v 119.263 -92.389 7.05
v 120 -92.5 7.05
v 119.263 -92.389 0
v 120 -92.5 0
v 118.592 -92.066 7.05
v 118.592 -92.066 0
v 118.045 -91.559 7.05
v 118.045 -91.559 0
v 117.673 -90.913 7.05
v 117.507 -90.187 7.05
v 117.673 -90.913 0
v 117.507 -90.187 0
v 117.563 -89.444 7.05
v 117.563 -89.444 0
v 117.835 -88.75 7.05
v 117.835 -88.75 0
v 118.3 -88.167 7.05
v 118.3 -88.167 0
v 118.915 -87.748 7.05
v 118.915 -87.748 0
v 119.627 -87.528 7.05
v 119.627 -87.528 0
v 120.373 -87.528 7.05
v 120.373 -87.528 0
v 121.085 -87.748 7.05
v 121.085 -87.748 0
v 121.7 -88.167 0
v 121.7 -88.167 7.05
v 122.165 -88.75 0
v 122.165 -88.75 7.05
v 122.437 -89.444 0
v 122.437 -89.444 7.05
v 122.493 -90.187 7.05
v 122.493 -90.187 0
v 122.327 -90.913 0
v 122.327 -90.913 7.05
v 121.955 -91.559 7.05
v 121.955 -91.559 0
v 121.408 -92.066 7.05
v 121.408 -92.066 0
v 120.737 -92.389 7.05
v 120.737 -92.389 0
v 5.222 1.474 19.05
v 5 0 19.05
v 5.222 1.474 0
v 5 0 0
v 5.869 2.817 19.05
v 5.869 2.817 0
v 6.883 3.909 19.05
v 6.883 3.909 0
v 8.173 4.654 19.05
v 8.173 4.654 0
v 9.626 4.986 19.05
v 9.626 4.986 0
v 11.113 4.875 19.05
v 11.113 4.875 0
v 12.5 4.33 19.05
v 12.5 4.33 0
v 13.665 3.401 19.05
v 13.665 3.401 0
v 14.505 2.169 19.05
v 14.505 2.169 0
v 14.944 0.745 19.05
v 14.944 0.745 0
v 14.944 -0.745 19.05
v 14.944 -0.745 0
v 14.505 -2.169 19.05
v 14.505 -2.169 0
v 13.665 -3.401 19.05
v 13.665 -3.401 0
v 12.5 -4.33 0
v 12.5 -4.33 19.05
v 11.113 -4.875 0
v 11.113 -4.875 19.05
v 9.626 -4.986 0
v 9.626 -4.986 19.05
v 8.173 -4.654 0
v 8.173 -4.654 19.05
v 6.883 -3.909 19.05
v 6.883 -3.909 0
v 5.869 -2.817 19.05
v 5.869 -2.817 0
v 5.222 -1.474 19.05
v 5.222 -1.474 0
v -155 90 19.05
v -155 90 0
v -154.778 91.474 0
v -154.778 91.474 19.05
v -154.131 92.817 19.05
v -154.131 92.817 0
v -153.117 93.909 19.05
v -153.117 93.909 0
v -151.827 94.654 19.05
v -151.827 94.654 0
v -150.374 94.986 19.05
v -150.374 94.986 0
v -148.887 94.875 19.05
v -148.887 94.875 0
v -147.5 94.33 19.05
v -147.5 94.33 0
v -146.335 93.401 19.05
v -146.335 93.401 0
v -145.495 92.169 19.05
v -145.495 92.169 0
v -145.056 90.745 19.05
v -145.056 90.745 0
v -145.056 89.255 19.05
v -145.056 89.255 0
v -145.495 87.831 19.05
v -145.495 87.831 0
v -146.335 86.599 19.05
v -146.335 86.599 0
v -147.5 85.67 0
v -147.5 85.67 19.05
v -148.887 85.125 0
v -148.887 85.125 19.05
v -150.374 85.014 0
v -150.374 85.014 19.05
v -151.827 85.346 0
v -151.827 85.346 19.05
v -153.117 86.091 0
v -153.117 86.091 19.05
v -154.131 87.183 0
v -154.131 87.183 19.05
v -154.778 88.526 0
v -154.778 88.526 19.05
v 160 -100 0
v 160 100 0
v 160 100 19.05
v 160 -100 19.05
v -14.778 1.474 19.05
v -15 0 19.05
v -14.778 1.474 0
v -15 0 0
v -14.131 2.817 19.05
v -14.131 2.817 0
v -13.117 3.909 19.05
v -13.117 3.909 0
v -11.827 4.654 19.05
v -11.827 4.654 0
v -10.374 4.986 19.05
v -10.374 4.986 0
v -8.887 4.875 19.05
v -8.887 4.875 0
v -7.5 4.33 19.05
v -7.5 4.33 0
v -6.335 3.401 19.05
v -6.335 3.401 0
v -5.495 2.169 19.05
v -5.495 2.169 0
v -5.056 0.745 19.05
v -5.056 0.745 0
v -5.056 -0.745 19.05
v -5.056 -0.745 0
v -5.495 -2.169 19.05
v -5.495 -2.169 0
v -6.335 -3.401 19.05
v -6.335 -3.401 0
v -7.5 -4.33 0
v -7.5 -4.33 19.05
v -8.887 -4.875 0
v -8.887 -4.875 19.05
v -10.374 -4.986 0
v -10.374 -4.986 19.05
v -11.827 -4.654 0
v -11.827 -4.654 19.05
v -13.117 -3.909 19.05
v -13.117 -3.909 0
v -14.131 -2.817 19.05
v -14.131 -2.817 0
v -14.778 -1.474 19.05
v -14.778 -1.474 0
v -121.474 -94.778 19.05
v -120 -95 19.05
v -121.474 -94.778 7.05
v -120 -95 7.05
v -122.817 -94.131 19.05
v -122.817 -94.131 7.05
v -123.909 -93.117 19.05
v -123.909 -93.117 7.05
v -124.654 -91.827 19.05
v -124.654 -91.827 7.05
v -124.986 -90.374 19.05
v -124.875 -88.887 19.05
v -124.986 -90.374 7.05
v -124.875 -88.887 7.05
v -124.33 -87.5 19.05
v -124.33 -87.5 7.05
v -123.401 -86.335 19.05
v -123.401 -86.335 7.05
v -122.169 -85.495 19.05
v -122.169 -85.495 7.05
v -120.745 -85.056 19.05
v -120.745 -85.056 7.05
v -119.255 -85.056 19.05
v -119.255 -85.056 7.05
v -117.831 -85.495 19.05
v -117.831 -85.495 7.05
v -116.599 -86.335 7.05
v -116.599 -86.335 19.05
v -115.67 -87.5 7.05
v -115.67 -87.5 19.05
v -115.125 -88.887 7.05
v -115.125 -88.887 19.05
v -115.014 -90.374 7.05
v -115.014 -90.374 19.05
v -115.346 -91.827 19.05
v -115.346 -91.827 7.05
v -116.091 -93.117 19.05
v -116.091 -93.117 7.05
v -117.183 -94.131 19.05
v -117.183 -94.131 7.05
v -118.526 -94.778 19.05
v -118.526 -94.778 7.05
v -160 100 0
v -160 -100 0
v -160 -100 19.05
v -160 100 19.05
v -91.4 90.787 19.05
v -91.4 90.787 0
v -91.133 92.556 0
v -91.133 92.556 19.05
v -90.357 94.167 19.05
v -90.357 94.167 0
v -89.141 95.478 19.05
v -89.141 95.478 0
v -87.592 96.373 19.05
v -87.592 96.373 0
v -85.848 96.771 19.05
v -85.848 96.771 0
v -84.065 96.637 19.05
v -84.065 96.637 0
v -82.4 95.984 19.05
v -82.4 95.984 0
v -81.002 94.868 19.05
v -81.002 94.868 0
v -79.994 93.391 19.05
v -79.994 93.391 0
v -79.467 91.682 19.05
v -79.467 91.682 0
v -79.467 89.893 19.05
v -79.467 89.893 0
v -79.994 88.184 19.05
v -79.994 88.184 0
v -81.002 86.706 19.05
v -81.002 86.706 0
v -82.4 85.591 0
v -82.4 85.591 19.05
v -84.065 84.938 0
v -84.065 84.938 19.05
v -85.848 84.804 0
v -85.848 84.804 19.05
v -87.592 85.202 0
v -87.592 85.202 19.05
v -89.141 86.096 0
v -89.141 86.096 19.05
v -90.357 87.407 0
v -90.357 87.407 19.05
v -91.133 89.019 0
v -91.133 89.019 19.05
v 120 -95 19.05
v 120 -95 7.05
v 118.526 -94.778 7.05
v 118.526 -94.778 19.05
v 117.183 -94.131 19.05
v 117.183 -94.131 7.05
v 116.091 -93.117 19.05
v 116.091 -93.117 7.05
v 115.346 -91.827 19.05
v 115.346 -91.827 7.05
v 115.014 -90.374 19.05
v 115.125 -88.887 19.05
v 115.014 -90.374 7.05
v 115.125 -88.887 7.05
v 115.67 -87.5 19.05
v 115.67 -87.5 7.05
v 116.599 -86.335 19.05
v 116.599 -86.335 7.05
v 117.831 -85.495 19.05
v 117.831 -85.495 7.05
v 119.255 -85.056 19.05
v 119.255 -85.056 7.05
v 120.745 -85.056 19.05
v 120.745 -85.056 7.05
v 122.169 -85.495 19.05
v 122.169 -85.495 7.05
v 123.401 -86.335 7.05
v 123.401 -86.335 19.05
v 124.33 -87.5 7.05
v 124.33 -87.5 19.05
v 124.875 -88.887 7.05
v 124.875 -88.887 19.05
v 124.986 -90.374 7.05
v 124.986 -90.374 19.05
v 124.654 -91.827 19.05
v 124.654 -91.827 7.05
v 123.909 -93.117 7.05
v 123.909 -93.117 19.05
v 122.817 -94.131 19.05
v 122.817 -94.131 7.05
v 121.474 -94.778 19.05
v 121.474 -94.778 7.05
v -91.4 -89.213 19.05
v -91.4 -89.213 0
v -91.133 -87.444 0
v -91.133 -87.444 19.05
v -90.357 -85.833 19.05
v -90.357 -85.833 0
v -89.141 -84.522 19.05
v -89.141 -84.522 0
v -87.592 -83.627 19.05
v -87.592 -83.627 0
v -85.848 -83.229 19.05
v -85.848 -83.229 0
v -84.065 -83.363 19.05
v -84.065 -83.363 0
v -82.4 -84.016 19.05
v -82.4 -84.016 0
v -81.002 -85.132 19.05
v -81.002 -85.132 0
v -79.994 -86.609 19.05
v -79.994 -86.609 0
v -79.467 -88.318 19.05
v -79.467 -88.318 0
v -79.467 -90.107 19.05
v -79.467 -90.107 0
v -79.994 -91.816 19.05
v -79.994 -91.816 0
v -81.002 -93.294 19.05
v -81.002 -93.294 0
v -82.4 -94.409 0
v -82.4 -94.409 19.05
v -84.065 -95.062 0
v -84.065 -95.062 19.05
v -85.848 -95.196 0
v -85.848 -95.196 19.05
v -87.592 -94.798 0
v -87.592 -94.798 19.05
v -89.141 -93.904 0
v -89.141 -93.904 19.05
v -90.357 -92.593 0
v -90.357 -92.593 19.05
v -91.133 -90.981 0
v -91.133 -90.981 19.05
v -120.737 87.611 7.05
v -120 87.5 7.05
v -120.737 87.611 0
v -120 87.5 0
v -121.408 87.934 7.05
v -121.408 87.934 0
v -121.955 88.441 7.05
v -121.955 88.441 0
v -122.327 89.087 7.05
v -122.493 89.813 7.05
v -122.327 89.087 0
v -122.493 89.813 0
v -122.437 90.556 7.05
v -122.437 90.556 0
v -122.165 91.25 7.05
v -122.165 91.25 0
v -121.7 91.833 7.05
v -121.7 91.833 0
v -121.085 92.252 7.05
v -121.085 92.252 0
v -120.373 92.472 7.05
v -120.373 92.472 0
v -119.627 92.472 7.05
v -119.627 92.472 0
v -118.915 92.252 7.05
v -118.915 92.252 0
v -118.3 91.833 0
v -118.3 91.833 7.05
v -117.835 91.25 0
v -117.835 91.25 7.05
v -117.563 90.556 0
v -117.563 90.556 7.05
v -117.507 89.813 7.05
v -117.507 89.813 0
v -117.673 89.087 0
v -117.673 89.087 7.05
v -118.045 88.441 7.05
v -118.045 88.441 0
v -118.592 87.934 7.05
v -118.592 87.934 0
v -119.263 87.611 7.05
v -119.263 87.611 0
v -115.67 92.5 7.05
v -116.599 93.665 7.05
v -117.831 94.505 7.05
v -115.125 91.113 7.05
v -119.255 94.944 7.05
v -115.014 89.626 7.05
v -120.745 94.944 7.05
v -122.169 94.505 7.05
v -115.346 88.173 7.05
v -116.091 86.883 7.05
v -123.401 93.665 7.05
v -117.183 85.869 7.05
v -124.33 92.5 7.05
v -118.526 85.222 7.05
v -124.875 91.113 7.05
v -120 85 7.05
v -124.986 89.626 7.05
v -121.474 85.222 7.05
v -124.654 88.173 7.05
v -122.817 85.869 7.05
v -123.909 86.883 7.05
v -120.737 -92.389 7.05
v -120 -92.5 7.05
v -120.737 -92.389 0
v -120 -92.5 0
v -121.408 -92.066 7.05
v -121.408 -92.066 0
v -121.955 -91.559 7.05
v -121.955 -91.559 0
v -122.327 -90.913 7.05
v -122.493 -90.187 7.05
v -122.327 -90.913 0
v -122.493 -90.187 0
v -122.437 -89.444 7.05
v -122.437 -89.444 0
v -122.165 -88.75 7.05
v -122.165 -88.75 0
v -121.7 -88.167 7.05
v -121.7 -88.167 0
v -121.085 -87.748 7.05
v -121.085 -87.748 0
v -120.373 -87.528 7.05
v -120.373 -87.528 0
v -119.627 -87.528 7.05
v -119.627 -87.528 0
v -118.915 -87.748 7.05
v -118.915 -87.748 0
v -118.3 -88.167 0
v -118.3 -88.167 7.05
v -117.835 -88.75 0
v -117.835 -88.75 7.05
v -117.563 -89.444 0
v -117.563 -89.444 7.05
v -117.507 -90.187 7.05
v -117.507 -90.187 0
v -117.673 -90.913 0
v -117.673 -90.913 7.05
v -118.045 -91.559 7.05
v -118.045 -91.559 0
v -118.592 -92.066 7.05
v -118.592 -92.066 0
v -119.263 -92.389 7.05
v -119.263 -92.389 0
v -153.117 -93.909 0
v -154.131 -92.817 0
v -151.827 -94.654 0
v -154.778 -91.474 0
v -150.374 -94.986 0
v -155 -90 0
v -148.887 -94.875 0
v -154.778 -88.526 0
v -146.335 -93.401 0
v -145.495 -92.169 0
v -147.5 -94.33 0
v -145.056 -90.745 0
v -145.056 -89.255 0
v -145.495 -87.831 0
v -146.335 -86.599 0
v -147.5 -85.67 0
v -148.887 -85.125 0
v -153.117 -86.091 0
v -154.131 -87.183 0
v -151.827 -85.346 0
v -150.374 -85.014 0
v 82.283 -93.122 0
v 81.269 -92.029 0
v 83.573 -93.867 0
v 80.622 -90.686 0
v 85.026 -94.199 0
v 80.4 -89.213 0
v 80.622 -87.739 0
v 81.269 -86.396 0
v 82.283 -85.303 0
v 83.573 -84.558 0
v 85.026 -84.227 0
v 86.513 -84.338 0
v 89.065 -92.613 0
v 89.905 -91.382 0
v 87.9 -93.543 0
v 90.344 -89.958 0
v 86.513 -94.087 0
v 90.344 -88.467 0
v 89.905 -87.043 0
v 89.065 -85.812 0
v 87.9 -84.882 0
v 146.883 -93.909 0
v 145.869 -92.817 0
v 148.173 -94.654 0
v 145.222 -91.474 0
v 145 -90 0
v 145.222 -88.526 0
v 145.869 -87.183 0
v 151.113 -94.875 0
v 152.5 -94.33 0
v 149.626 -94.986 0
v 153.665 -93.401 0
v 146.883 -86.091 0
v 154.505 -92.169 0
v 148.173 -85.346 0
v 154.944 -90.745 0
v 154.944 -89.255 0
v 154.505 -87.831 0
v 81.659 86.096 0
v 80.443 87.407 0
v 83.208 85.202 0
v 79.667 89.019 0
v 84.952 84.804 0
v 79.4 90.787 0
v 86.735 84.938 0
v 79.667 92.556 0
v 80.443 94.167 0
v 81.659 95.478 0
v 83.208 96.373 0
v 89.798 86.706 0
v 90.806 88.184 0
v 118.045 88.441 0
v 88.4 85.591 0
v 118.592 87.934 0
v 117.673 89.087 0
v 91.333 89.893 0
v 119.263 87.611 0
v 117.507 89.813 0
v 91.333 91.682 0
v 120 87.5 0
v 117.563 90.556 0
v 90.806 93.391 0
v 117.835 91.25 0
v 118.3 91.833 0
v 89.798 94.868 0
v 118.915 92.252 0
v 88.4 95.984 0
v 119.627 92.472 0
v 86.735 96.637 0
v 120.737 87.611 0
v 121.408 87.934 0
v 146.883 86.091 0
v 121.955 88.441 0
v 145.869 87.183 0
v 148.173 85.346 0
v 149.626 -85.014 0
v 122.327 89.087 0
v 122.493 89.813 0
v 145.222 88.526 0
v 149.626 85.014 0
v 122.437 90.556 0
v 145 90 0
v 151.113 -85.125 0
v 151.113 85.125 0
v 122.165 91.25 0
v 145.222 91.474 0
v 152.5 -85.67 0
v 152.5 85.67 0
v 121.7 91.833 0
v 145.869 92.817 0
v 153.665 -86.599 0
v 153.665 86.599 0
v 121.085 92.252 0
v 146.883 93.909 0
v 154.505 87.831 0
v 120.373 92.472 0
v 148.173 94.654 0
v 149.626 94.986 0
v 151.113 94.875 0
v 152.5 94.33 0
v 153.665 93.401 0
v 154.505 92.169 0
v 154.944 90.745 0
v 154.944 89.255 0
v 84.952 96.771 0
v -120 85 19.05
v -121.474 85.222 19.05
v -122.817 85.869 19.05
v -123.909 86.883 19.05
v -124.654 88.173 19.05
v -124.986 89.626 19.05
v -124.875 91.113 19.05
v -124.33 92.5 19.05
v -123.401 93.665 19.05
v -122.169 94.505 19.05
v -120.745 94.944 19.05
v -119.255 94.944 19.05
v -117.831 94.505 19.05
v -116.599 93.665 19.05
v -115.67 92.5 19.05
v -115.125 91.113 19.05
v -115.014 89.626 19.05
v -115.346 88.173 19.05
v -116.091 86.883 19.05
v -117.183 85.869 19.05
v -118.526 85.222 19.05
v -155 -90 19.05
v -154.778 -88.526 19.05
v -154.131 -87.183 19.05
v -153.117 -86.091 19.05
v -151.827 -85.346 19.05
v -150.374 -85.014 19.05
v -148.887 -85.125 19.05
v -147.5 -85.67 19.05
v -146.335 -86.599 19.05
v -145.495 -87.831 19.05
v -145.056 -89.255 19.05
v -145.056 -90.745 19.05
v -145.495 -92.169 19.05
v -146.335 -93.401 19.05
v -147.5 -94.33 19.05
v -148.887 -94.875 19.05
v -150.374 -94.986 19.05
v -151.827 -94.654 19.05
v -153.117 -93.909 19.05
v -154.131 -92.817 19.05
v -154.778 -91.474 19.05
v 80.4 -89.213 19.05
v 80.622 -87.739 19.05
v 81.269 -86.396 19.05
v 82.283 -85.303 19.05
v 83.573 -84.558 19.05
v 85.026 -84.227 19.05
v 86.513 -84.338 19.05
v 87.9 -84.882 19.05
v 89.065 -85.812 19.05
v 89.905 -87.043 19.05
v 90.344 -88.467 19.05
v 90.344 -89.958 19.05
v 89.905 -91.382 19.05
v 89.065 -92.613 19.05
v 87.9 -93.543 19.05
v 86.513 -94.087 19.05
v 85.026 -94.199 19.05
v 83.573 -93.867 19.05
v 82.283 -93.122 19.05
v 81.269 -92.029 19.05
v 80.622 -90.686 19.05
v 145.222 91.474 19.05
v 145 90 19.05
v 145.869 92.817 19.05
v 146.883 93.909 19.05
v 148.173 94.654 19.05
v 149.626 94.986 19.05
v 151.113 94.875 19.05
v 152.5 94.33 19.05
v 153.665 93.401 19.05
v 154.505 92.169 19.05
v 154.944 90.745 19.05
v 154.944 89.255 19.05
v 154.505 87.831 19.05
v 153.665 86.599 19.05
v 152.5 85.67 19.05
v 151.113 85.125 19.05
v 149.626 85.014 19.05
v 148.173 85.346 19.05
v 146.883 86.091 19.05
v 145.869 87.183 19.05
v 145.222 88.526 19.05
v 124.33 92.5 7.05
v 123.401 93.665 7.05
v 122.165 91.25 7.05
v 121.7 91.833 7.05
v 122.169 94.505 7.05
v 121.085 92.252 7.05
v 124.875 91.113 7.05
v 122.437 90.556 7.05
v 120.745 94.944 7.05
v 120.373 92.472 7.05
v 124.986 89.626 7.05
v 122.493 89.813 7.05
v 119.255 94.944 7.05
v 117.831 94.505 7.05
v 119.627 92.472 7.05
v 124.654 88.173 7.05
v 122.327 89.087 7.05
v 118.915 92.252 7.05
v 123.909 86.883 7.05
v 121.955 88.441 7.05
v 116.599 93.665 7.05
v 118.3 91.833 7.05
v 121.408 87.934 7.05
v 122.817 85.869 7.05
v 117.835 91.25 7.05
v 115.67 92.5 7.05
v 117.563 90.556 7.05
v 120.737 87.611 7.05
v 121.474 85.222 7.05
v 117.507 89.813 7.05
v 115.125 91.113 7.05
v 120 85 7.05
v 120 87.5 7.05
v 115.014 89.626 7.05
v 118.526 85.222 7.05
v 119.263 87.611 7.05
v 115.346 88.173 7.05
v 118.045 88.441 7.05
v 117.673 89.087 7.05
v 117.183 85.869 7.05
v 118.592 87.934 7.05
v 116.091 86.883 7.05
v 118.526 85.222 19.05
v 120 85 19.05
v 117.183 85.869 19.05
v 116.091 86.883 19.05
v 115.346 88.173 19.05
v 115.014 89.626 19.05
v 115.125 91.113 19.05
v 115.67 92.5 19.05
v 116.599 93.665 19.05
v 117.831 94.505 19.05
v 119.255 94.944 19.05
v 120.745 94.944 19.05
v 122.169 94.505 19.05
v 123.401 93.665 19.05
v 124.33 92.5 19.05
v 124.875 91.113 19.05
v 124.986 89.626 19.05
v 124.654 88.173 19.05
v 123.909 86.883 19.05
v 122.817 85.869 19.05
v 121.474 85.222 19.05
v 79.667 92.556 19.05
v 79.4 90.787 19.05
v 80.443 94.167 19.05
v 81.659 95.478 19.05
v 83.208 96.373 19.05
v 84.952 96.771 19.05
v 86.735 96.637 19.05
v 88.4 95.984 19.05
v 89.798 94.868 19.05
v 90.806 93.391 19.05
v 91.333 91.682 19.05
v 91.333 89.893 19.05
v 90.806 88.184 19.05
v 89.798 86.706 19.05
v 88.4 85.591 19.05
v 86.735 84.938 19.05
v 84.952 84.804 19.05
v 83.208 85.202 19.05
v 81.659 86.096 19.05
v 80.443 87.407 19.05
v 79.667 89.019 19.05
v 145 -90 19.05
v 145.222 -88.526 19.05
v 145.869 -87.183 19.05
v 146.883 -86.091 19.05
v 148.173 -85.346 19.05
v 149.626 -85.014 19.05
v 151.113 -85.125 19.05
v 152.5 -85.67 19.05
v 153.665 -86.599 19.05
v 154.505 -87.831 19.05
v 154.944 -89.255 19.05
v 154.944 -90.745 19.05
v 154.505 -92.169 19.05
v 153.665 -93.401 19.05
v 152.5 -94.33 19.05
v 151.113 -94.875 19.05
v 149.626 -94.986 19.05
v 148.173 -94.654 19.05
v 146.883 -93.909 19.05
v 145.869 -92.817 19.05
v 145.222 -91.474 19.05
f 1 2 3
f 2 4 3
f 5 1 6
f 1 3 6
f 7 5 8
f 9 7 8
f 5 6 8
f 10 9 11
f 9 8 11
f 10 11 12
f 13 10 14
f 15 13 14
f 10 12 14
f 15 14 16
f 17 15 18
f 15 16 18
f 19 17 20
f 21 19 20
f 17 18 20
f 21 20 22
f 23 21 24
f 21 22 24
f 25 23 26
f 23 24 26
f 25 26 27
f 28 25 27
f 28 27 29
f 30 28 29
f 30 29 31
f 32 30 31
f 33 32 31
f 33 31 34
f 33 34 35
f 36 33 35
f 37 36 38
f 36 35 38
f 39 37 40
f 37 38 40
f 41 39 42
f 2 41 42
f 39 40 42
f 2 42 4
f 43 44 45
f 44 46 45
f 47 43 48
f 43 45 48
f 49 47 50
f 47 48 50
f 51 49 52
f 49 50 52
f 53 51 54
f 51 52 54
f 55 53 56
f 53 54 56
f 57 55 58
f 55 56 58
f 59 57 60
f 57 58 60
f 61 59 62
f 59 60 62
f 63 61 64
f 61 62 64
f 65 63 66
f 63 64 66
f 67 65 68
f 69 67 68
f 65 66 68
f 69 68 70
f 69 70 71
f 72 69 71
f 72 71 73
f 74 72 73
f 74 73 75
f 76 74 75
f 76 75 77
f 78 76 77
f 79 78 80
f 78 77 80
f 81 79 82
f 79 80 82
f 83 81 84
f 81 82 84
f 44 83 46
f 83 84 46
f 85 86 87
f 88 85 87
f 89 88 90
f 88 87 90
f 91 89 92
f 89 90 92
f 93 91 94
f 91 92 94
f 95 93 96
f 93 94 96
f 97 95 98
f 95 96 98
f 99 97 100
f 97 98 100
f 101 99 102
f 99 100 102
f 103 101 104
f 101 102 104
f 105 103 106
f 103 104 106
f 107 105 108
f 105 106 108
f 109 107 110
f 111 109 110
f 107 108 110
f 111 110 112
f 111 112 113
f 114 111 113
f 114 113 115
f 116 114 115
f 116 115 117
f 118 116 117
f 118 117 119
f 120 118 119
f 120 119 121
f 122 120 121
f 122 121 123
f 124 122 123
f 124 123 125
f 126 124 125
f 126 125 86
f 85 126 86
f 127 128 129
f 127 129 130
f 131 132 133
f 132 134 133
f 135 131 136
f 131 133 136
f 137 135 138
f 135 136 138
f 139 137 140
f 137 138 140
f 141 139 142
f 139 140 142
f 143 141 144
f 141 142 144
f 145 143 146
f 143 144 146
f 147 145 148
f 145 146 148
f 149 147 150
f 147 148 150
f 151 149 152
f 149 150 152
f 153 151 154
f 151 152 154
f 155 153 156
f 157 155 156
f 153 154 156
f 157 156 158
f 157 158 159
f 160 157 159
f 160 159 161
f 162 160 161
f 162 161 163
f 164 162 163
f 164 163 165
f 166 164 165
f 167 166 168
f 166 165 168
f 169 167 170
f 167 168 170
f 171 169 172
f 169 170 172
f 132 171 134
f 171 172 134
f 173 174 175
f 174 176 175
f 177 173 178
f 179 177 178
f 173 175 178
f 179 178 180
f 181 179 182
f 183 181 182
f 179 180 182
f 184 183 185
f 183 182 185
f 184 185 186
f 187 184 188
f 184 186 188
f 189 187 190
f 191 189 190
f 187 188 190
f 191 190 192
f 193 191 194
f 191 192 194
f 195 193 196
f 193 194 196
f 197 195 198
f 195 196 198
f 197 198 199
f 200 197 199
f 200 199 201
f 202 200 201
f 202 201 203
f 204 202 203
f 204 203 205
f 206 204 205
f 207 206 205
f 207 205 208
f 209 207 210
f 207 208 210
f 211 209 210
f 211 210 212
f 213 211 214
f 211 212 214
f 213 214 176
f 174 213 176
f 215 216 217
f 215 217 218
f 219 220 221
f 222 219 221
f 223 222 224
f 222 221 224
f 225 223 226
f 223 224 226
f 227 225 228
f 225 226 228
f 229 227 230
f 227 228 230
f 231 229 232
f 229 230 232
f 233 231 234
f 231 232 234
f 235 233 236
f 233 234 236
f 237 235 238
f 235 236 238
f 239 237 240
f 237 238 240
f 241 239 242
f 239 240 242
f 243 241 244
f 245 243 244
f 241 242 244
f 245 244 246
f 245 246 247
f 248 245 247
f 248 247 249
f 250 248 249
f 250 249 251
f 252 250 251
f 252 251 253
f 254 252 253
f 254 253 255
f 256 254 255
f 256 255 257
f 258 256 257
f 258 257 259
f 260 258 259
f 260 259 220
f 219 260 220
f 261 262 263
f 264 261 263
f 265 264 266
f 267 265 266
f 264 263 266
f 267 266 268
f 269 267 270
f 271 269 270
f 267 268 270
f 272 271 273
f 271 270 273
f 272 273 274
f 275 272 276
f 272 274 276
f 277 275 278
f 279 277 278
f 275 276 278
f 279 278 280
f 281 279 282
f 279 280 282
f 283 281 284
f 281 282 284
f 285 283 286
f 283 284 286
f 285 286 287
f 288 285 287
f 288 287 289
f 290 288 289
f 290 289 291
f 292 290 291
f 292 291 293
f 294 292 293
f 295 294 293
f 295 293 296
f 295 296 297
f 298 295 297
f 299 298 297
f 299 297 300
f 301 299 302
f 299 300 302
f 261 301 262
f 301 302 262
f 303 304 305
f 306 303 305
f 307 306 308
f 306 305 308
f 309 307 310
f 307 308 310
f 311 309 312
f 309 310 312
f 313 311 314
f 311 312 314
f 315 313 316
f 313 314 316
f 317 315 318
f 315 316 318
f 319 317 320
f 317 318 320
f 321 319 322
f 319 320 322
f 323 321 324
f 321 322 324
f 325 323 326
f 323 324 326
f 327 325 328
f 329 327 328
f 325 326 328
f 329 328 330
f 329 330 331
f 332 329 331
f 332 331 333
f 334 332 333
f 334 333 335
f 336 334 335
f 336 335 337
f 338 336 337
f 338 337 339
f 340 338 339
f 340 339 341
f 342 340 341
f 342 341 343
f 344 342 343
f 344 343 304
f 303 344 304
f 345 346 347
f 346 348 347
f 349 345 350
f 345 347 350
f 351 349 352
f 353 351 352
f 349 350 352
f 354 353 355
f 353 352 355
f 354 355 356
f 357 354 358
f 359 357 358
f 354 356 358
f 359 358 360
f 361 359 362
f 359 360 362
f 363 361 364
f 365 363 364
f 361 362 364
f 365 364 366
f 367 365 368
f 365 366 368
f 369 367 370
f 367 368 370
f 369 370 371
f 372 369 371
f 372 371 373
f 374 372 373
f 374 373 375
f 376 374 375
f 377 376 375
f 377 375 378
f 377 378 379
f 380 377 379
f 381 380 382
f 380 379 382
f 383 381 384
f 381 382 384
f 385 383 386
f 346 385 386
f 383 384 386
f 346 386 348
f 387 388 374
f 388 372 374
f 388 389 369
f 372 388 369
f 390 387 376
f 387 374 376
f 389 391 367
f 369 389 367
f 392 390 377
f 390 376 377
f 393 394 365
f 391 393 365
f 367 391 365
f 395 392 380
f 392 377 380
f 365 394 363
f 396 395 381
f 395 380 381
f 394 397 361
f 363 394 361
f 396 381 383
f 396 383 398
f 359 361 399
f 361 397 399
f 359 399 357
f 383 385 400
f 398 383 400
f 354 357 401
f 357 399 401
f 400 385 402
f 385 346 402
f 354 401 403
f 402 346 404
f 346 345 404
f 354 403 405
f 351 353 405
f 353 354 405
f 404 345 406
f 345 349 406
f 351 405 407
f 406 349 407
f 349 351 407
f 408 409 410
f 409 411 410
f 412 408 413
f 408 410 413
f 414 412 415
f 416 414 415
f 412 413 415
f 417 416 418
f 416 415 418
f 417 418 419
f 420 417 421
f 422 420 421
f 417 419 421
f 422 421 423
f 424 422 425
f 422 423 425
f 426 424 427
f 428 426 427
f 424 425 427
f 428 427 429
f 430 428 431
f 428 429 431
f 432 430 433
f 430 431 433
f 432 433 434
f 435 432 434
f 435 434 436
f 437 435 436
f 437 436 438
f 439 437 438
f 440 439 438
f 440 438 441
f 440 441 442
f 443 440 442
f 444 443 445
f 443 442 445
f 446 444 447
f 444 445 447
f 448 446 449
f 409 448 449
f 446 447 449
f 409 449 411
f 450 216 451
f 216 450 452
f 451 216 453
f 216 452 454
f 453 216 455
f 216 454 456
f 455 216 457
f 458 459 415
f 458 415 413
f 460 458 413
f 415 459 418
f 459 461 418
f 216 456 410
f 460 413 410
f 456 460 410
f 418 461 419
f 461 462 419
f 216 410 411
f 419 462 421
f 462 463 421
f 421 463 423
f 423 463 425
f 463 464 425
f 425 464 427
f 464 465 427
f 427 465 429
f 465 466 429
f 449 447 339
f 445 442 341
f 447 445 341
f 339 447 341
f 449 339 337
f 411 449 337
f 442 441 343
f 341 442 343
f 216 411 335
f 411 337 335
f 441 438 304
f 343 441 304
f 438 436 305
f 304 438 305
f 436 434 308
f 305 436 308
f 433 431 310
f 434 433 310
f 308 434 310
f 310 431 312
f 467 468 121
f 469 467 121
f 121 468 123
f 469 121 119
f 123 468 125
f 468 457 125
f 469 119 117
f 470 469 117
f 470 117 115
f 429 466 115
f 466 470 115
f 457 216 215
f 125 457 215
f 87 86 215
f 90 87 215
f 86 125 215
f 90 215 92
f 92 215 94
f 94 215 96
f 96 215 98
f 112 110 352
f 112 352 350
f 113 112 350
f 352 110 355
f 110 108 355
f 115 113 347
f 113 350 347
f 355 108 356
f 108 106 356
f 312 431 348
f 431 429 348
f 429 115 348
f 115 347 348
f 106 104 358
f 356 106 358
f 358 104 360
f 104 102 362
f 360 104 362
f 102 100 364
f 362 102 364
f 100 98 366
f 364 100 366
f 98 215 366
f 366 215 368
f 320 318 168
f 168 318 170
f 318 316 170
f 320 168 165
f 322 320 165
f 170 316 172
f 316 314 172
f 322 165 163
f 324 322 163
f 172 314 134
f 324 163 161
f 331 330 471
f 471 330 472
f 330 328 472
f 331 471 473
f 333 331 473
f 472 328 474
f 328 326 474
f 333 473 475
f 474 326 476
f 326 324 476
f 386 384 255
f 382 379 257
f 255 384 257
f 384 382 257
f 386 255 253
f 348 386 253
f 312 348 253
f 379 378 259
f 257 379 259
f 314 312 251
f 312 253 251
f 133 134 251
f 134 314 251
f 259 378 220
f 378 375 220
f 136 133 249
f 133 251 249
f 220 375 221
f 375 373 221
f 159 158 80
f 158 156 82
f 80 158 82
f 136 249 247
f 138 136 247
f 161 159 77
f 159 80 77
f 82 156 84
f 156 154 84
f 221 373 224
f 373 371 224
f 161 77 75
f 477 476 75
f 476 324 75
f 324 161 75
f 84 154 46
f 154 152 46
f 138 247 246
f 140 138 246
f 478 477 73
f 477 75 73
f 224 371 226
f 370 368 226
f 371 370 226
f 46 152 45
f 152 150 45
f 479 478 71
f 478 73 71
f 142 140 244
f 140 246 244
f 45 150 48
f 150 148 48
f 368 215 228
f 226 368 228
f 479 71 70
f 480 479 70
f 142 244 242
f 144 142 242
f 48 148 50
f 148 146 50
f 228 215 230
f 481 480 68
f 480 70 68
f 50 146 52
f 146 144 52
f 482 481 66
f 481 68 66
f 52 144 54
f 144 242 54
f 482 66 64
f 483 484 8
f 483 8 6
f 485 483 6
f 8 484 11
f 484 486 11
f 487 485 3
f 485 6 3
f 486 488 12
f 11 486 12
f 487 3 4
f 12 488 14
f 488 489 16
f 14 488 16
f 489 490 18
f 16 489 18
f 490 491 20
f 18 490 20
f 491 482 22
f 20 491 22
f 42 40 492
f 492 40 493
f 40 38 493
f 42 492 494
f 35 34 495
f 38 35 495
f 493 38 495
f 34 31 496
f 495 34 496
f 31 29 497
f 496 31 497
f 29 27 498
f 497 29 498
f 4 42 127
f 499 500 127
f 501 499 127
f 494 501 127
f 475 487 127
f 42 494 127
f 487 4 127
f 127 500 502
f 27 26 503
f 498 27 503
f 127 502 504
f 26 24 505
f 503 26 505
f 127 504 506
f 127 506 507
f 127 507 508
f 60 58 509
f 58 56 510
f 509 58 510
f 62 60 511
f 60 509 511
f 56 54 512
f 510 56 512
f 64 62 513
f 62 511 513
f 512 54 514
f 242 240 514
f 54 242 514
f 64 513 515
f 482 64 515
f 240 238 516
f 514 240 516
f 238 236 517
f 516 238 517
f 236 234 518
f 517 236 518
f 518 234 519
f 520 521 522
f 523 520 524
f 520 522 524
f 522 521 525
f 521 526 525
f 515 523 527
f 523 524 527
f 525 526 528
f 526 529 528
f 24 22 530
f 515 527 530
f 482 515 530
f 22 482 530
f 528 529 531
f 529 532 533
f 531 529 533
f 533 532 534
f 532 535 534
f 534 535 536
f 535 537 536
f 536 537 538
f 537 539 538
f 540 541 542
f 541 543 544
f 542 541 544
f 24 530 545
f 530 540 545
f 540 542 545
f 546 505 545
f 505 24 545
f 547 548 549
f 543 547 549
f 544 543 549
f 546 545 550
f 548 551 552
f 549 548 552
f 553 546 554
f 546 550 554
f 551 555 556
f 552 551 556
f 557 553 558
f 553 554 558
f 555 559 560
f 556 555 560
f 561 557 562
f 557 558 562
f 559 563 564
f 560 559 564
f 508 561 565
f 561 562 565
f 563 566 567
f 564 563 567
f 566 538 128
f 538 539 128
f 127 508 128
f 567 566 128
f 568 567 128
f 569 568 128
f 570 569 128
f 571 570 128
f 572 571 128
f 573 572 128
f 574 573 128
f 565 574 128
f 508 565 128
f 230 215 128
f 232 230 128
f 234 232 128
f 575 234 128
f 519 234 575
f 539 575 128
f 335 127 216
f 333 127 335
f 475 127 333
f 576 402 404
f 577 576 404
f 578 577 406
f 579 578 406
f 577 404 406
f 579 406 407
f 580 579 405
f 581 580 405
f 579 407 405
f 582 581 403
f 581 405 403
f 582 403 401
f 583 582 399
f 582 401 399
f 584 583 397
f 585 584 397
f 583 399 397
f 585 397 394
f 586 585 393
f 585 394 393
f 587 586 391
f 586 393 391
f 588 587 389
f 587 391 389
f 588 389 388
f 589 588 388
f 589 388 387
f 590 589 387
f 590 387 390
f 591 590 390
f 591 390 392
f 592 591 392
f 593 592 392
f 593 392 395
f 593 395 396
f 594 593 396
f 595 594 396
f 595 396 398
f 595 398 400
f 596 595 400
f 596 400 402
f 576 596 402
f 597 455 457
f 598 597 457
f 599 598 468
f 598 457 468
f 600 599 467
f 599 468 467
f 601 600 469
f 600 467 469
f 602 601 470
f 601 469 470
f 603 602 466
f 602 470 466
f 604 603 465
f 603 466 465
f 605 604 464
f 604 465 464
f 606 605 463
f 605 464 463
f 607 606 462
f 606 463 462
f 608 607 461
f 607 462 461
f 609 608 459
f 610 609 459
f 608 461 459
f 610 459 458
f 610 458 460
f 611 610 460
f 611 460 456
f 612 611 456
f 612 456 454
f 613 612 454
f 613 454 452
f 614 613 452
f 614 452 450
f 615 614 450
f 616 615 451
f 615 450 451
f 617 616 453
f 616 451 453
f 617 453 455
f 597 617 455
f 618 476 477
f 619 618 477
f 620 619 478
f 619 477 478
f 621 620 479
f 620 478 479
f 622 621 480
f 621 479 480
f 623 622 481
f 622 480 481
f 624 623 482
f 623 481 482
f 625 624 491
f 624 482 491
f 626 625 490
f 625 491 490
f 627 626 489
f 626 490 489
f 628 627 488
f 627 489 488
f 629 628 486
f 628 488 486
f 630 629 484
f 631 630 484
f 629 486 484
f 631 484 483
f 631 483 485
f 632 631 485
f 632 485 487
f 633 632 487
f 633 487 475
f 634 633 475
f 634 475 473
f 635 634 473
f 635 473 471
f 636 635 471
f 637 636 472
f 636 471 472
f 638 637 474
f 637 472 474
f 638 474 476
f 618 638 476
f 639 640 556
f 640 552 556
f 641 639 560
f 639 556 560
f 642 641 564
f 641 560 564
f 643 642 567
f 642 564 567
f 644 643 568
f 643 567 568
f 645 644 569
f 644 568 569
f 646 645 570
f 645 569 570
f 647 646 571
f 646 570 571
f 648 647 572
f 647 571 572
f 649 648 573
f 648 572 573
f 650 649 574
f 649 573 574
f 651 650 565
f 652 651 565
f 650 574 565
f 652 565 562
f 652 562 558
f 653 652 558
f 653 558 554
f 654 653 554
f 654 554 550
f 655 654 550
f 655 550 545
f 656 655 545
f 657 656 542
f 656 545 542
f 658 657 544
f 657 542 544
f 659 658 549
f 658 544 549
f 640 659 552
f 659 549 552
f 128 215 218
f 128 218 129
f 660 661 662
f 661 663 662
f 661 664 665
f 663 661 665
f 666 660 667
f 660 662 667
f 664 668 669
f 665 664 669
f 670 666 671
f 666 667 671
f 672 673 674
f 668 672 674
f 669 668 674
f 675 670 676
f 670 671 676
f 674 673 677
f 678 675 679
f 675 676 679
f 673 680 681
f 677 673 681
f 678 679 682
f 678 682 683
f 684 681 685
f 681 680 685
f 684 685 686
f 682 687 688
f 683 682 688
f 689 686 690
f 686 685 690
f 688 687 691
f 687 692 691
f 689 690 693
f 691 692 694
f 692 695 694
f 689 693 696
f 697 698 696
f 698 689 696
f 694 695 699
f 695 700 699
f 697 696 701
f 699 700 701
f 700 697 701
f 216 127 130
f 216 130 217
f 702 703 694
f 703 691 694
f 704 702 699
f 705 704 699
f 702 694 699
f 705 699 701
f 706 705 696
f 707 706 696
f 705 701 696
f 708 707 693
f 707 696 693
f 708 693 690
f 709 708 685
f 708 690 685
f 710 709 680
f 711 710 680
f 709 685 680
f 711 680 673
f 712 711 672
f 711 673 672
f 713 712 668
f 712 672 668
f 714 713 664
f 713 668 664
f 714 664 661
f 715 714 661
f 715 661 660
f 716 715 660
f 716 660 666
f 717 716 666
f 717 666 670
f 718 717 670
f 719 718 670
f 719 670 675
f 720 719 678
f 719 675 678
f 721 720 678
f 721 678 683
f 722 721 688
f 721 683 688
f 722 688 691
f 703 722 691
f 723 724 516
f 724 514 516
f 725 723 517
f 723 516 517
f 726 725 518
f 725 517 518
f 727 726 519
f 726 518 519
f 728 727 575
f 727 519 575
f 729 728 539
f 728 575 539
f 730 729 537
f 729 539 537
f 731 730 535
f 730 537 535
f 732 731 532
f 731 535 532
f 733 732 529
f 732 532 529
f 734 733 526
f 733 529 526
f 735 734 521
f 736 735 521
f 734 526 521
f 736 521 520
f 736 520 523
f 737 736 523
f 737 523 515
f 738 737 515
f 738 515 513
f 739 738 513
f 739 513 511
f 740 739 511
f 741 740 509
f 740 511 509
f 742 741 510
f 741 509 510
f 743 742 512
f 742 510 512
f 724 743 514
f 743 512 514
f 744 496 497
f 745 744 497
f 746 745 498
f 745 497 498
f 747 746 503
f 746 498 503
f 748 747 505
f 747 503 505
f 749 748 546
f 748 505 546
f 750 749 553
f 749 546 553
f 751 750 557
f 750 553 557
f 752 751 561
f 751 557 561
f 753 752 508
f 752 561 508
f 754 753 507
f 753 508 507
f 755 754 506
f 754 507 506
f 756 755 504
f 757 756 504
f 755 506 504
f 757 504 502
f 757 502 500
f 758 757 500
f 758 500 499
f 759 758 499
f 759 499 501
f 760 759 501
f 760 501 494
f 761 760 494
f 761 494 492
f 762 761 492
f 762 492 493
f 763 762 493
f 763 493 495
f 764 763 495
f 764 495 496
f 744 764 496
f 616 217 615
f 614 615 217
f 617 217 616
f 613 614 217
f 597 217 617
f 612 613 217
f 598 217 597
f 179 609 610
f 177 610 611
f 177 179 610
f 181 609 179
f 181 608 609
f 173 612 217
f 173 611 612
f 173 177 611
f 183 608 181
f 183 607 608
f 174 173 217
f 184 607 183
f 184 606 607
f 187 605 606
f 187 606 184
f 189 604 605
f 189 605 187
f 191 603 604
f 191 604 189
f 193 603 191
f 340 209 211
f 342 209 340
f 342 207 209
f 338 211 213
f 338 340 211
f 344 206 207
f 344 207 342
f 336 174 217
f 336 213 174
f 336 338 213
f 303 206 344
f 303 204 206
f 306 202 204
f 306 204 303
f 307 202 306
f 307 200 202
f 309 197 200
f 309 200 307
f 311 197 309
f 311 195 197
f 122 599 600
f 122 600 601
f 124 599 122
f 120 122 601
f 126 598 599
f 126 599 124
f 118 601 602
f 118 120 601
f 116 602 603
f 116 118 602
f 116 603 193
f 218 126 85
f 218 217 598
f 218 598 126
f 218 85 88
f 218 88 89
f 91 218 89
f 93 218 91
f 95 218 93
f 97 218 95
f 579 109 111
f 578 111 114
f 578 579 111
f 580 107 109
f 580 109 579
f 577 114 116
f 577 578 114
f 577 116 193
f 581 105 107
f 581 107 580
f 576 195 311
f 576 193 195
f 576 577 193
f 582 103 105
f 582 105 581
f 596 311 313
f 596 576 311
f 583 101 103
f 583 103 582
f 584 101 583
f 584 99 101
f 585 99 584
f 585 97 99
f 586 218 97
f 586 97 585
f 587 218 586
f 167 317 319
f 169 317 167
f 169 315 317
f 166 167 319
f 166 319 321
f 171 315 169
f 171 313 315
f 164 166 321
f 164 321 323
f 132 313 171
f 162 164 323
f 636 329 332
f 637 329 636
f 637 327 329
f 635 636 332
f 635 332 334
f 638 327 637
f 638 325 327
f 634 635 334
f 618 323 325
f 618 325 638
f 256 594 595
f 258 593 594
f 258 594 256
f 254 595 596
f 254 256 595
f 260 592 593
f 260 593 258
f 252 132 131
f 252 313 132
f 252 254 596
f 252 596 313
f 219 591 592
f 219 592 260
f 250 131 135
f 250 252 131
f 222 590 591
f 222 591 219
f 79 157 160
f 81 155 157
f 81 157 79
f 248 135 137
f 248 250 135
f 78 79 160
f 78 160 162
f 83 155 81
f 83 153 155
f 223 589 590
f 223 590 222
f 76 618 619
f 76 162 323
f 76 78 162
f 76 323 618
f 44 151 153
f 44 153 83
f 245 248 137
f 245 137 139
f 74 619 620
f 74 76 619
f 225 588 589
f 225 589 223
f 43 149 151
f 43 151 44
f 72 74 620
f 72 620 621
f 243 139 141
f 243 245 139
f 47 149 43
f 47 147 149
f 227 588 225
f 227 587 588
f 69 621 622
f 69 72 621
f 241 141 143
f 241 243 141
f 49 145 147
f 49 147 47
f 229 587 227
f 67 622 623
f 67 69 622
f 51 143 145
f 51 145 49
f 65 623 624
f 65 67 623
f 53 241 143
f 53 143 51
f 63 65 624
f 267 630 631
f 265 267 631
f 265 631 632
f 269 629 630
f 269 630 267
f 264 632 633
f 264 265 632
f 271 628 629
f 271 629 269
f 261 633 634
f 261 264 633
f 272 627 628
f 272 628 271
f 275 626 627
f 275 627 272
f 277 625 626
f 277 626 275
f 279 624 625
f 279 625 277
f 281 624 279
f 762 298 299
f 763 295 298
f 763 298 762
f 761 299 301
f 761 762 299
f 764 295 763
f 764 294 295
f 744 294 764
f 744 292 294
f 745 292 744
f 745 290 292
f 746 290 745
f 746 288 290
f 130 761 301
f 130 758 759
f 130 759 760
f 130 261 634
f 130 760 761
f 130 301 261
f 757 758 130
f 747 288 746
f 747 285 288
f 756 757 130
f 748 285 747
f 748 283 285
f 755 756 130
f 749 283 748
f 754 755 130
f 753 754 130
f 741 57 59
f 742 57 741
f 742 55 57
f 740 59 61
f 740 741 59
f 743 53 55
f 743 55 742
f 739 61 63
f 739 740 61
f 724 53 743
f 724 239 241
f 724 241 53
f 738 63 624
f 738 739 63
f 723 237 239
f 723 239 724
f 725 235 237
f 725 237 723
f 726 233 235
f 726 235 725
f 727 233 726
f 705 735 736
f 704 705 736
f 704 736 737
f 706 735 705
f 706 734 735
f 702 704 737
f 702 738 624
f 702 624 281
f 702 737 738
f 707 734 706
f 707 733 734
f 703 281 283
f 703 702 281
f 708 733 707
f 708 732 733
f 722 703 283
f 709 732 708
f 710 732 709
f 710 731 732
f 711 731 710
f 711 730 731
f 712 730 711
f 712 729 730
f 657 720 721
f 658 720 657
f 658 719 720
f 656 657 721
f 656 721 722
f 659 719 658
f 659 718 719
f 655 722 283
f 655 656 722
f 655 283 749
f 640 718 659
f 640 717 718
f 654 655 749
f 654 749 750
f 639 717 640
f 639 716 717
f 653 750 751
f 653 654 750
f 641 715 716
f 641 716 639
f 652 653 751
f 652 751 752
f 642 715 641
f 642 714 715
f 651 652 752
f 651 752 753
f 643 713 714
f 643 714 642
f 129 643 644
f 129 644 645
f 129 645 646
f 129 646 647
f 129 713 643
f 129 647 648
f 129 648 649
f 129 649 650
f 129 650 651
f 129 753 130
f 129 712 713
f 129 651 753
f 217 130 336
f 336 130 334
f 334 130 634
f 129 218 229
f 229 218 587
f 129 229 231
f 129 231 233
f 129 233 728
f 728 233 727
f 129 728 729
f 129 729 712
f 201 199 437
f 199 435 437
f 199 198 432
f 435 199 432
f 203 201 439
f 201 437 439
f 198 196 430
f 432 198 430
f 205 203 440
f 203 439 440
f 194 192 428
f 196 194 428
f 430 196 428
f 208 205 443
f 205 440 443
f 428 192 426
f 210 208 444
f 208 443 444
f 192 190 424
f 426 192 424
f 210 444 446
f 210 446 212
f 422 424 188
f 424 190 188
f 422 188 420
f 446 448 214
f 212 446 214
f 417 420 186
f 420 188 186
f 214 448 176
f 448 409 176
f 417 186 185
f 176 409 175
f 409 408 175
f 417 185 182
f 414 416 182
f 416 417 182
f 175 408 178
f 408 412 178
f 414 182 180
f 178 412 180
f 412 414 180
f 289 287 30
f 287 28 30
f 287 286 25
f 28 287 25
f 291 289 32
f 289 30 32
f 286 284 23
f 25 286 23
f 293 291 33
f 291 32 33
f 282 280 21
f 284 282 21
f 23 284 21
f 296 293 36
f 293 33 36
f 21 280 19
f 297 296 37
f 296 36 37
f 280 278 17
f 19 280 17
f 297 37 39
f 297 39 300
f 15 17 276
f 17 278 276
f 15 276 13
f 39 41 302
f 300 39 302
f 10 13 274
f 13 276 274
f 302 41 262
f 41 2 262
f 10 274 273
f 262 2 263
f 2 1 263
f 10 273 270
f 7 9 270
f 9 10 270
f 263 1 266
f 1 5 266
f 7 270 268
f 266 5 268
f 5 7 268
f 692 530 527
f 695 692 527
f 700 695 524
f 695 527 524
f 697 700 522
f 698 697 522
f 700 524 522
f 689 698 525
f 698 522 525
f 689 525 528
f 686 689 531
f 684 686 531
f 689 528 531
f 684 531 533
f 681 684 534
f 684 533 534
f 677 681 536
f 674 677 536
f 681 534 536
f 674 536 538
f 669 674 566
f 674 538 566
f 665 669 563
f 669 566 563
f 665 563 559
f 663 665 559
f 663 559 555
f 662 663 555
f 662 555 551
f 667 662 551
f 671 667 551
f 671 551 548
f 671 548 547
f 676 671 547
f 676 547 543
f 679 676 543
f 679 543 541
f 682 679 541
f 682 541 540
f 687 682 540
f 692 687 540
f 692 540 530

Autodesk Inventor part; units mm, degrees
ref_plane "YZ Plane" through (0, 0, 0) normal (1, 0, 0) x (0, 1, 0)
ref_plane "XZ Plane" through (0, 0, 0) normal (0, 1, 0) x (-1, 0, 0)
ref_plane "XY Plane" through (0, 0, 0) normal (0, 0, 1) x (1, 0, 0)
sketch "Sketch1" plane through (0, 0, 0) normal (0, 0, 1) x (1, 0, 0)
  line L0 (-160, 100) -> (160, 100)
  line L1 (160, 100) -> (160, -100)
  line L2 (160, -100) -> (-160, -100)
  line L3 (-160, -100) -> (-160, 100)
  point P0 (0, 0)
  dimension "d0" = 320
  dimension "d1" = 200
  dimension "d2" = 160
  dimension "d3" = 100
extrude "Extrusion1" add sketch "Sketch1" along normal blind 19.05
sketch "Sketch2" plane through (0, 0, 0) normal (0, 0, -1) x (-1, 0, 0)
  circle A0 centre (150, 90) radius 2.5 projected
  circle A1 centre (85.4, 90.7874) radius 2.0701 projected
  circle A2 centre (85.4, -89.2126) radius 2.5 projected
  circle A3 centre (150, -90) radius 2.5 projected
  circle A4 centre (10, 0) radius 2.067 projected
  circle A5 centre (-10, 0) radius 2.067 projected
  circle A6 centre (-85.4, -89.2126) radius 2.0701 projected
  circle A7 centre (-150, -90) radius 2.5 projected
  circle A8 centre (-85.4, 90.7874) radius 2.0701 projected
  circle A9 centre (-150, 90) radius 2.5 projected
  circle A10 centre (-150, -90) radius 5
  circle A11 centre (-85.4, -89.2126) radius 5
  circle A12 centre (-150, 90) radius 5
  circle A13 centre (-85.4, 90.7874) radius 6
  circle A14 centre (-10, 0) radius 5
  circle A15 centre (10, 0) radius 5
  circle A16 centre (85.4, 90.7874) radius 6
  circle A17 centre (150, 90) radius 5
  circle A18 centre (85.4, -89.2126) radius 6
  circle A19 centre (150, -90) radius 5
  point P0 (0, 0)
  dimension "d6" = 10
  dimension "d7" = 10
  dimension "d8" = 10
  dimension "d9" = 12
  dimension "d10" = 10
  dimension "d11" = 10
  dimension "d12" = 12
  dimension "d13" = 10
  dimension "d14" = 12
  dimension "d15" = 10
extrude "Extrusion2" cut sketch "Sketch2" against normal through all contours A0 | A1 | A2 | A3 | A4 | A5 | A6 | A7 | A8 | A9 | A10 | A11 | A12 | A13 | A14 | A15 | A16 | A17 | A18 | A19
sketch "Sketch5" plane through (0, 0, 19.05) normal (0, 0, 1) x (1, 0, 0)
  circle A0 centre (-120, 90) radius 2.75 projected
  circle A1 centre (-120, -90) radius 2.75 projected
  circle A2 centre (120, -90) radius 2.75 projected
  circle A3 centre (120, 90) radius 2.75 projected
  point P0 (0, 0)
hole "Hole1" at (-120, 90, 19.05) at (-120, -90, 19.05) at (120, -90, 19.05) at (120, 90, 19.05) direction (0, 0, -1) diameter 5 end through all counterbore diameter 10 counterbore depth 12
equation "\"d2\" = 0.5 * d0"
equation "\"d3\" = 0.5 * d1"
properties part number "wasteboard" material "Wood"
